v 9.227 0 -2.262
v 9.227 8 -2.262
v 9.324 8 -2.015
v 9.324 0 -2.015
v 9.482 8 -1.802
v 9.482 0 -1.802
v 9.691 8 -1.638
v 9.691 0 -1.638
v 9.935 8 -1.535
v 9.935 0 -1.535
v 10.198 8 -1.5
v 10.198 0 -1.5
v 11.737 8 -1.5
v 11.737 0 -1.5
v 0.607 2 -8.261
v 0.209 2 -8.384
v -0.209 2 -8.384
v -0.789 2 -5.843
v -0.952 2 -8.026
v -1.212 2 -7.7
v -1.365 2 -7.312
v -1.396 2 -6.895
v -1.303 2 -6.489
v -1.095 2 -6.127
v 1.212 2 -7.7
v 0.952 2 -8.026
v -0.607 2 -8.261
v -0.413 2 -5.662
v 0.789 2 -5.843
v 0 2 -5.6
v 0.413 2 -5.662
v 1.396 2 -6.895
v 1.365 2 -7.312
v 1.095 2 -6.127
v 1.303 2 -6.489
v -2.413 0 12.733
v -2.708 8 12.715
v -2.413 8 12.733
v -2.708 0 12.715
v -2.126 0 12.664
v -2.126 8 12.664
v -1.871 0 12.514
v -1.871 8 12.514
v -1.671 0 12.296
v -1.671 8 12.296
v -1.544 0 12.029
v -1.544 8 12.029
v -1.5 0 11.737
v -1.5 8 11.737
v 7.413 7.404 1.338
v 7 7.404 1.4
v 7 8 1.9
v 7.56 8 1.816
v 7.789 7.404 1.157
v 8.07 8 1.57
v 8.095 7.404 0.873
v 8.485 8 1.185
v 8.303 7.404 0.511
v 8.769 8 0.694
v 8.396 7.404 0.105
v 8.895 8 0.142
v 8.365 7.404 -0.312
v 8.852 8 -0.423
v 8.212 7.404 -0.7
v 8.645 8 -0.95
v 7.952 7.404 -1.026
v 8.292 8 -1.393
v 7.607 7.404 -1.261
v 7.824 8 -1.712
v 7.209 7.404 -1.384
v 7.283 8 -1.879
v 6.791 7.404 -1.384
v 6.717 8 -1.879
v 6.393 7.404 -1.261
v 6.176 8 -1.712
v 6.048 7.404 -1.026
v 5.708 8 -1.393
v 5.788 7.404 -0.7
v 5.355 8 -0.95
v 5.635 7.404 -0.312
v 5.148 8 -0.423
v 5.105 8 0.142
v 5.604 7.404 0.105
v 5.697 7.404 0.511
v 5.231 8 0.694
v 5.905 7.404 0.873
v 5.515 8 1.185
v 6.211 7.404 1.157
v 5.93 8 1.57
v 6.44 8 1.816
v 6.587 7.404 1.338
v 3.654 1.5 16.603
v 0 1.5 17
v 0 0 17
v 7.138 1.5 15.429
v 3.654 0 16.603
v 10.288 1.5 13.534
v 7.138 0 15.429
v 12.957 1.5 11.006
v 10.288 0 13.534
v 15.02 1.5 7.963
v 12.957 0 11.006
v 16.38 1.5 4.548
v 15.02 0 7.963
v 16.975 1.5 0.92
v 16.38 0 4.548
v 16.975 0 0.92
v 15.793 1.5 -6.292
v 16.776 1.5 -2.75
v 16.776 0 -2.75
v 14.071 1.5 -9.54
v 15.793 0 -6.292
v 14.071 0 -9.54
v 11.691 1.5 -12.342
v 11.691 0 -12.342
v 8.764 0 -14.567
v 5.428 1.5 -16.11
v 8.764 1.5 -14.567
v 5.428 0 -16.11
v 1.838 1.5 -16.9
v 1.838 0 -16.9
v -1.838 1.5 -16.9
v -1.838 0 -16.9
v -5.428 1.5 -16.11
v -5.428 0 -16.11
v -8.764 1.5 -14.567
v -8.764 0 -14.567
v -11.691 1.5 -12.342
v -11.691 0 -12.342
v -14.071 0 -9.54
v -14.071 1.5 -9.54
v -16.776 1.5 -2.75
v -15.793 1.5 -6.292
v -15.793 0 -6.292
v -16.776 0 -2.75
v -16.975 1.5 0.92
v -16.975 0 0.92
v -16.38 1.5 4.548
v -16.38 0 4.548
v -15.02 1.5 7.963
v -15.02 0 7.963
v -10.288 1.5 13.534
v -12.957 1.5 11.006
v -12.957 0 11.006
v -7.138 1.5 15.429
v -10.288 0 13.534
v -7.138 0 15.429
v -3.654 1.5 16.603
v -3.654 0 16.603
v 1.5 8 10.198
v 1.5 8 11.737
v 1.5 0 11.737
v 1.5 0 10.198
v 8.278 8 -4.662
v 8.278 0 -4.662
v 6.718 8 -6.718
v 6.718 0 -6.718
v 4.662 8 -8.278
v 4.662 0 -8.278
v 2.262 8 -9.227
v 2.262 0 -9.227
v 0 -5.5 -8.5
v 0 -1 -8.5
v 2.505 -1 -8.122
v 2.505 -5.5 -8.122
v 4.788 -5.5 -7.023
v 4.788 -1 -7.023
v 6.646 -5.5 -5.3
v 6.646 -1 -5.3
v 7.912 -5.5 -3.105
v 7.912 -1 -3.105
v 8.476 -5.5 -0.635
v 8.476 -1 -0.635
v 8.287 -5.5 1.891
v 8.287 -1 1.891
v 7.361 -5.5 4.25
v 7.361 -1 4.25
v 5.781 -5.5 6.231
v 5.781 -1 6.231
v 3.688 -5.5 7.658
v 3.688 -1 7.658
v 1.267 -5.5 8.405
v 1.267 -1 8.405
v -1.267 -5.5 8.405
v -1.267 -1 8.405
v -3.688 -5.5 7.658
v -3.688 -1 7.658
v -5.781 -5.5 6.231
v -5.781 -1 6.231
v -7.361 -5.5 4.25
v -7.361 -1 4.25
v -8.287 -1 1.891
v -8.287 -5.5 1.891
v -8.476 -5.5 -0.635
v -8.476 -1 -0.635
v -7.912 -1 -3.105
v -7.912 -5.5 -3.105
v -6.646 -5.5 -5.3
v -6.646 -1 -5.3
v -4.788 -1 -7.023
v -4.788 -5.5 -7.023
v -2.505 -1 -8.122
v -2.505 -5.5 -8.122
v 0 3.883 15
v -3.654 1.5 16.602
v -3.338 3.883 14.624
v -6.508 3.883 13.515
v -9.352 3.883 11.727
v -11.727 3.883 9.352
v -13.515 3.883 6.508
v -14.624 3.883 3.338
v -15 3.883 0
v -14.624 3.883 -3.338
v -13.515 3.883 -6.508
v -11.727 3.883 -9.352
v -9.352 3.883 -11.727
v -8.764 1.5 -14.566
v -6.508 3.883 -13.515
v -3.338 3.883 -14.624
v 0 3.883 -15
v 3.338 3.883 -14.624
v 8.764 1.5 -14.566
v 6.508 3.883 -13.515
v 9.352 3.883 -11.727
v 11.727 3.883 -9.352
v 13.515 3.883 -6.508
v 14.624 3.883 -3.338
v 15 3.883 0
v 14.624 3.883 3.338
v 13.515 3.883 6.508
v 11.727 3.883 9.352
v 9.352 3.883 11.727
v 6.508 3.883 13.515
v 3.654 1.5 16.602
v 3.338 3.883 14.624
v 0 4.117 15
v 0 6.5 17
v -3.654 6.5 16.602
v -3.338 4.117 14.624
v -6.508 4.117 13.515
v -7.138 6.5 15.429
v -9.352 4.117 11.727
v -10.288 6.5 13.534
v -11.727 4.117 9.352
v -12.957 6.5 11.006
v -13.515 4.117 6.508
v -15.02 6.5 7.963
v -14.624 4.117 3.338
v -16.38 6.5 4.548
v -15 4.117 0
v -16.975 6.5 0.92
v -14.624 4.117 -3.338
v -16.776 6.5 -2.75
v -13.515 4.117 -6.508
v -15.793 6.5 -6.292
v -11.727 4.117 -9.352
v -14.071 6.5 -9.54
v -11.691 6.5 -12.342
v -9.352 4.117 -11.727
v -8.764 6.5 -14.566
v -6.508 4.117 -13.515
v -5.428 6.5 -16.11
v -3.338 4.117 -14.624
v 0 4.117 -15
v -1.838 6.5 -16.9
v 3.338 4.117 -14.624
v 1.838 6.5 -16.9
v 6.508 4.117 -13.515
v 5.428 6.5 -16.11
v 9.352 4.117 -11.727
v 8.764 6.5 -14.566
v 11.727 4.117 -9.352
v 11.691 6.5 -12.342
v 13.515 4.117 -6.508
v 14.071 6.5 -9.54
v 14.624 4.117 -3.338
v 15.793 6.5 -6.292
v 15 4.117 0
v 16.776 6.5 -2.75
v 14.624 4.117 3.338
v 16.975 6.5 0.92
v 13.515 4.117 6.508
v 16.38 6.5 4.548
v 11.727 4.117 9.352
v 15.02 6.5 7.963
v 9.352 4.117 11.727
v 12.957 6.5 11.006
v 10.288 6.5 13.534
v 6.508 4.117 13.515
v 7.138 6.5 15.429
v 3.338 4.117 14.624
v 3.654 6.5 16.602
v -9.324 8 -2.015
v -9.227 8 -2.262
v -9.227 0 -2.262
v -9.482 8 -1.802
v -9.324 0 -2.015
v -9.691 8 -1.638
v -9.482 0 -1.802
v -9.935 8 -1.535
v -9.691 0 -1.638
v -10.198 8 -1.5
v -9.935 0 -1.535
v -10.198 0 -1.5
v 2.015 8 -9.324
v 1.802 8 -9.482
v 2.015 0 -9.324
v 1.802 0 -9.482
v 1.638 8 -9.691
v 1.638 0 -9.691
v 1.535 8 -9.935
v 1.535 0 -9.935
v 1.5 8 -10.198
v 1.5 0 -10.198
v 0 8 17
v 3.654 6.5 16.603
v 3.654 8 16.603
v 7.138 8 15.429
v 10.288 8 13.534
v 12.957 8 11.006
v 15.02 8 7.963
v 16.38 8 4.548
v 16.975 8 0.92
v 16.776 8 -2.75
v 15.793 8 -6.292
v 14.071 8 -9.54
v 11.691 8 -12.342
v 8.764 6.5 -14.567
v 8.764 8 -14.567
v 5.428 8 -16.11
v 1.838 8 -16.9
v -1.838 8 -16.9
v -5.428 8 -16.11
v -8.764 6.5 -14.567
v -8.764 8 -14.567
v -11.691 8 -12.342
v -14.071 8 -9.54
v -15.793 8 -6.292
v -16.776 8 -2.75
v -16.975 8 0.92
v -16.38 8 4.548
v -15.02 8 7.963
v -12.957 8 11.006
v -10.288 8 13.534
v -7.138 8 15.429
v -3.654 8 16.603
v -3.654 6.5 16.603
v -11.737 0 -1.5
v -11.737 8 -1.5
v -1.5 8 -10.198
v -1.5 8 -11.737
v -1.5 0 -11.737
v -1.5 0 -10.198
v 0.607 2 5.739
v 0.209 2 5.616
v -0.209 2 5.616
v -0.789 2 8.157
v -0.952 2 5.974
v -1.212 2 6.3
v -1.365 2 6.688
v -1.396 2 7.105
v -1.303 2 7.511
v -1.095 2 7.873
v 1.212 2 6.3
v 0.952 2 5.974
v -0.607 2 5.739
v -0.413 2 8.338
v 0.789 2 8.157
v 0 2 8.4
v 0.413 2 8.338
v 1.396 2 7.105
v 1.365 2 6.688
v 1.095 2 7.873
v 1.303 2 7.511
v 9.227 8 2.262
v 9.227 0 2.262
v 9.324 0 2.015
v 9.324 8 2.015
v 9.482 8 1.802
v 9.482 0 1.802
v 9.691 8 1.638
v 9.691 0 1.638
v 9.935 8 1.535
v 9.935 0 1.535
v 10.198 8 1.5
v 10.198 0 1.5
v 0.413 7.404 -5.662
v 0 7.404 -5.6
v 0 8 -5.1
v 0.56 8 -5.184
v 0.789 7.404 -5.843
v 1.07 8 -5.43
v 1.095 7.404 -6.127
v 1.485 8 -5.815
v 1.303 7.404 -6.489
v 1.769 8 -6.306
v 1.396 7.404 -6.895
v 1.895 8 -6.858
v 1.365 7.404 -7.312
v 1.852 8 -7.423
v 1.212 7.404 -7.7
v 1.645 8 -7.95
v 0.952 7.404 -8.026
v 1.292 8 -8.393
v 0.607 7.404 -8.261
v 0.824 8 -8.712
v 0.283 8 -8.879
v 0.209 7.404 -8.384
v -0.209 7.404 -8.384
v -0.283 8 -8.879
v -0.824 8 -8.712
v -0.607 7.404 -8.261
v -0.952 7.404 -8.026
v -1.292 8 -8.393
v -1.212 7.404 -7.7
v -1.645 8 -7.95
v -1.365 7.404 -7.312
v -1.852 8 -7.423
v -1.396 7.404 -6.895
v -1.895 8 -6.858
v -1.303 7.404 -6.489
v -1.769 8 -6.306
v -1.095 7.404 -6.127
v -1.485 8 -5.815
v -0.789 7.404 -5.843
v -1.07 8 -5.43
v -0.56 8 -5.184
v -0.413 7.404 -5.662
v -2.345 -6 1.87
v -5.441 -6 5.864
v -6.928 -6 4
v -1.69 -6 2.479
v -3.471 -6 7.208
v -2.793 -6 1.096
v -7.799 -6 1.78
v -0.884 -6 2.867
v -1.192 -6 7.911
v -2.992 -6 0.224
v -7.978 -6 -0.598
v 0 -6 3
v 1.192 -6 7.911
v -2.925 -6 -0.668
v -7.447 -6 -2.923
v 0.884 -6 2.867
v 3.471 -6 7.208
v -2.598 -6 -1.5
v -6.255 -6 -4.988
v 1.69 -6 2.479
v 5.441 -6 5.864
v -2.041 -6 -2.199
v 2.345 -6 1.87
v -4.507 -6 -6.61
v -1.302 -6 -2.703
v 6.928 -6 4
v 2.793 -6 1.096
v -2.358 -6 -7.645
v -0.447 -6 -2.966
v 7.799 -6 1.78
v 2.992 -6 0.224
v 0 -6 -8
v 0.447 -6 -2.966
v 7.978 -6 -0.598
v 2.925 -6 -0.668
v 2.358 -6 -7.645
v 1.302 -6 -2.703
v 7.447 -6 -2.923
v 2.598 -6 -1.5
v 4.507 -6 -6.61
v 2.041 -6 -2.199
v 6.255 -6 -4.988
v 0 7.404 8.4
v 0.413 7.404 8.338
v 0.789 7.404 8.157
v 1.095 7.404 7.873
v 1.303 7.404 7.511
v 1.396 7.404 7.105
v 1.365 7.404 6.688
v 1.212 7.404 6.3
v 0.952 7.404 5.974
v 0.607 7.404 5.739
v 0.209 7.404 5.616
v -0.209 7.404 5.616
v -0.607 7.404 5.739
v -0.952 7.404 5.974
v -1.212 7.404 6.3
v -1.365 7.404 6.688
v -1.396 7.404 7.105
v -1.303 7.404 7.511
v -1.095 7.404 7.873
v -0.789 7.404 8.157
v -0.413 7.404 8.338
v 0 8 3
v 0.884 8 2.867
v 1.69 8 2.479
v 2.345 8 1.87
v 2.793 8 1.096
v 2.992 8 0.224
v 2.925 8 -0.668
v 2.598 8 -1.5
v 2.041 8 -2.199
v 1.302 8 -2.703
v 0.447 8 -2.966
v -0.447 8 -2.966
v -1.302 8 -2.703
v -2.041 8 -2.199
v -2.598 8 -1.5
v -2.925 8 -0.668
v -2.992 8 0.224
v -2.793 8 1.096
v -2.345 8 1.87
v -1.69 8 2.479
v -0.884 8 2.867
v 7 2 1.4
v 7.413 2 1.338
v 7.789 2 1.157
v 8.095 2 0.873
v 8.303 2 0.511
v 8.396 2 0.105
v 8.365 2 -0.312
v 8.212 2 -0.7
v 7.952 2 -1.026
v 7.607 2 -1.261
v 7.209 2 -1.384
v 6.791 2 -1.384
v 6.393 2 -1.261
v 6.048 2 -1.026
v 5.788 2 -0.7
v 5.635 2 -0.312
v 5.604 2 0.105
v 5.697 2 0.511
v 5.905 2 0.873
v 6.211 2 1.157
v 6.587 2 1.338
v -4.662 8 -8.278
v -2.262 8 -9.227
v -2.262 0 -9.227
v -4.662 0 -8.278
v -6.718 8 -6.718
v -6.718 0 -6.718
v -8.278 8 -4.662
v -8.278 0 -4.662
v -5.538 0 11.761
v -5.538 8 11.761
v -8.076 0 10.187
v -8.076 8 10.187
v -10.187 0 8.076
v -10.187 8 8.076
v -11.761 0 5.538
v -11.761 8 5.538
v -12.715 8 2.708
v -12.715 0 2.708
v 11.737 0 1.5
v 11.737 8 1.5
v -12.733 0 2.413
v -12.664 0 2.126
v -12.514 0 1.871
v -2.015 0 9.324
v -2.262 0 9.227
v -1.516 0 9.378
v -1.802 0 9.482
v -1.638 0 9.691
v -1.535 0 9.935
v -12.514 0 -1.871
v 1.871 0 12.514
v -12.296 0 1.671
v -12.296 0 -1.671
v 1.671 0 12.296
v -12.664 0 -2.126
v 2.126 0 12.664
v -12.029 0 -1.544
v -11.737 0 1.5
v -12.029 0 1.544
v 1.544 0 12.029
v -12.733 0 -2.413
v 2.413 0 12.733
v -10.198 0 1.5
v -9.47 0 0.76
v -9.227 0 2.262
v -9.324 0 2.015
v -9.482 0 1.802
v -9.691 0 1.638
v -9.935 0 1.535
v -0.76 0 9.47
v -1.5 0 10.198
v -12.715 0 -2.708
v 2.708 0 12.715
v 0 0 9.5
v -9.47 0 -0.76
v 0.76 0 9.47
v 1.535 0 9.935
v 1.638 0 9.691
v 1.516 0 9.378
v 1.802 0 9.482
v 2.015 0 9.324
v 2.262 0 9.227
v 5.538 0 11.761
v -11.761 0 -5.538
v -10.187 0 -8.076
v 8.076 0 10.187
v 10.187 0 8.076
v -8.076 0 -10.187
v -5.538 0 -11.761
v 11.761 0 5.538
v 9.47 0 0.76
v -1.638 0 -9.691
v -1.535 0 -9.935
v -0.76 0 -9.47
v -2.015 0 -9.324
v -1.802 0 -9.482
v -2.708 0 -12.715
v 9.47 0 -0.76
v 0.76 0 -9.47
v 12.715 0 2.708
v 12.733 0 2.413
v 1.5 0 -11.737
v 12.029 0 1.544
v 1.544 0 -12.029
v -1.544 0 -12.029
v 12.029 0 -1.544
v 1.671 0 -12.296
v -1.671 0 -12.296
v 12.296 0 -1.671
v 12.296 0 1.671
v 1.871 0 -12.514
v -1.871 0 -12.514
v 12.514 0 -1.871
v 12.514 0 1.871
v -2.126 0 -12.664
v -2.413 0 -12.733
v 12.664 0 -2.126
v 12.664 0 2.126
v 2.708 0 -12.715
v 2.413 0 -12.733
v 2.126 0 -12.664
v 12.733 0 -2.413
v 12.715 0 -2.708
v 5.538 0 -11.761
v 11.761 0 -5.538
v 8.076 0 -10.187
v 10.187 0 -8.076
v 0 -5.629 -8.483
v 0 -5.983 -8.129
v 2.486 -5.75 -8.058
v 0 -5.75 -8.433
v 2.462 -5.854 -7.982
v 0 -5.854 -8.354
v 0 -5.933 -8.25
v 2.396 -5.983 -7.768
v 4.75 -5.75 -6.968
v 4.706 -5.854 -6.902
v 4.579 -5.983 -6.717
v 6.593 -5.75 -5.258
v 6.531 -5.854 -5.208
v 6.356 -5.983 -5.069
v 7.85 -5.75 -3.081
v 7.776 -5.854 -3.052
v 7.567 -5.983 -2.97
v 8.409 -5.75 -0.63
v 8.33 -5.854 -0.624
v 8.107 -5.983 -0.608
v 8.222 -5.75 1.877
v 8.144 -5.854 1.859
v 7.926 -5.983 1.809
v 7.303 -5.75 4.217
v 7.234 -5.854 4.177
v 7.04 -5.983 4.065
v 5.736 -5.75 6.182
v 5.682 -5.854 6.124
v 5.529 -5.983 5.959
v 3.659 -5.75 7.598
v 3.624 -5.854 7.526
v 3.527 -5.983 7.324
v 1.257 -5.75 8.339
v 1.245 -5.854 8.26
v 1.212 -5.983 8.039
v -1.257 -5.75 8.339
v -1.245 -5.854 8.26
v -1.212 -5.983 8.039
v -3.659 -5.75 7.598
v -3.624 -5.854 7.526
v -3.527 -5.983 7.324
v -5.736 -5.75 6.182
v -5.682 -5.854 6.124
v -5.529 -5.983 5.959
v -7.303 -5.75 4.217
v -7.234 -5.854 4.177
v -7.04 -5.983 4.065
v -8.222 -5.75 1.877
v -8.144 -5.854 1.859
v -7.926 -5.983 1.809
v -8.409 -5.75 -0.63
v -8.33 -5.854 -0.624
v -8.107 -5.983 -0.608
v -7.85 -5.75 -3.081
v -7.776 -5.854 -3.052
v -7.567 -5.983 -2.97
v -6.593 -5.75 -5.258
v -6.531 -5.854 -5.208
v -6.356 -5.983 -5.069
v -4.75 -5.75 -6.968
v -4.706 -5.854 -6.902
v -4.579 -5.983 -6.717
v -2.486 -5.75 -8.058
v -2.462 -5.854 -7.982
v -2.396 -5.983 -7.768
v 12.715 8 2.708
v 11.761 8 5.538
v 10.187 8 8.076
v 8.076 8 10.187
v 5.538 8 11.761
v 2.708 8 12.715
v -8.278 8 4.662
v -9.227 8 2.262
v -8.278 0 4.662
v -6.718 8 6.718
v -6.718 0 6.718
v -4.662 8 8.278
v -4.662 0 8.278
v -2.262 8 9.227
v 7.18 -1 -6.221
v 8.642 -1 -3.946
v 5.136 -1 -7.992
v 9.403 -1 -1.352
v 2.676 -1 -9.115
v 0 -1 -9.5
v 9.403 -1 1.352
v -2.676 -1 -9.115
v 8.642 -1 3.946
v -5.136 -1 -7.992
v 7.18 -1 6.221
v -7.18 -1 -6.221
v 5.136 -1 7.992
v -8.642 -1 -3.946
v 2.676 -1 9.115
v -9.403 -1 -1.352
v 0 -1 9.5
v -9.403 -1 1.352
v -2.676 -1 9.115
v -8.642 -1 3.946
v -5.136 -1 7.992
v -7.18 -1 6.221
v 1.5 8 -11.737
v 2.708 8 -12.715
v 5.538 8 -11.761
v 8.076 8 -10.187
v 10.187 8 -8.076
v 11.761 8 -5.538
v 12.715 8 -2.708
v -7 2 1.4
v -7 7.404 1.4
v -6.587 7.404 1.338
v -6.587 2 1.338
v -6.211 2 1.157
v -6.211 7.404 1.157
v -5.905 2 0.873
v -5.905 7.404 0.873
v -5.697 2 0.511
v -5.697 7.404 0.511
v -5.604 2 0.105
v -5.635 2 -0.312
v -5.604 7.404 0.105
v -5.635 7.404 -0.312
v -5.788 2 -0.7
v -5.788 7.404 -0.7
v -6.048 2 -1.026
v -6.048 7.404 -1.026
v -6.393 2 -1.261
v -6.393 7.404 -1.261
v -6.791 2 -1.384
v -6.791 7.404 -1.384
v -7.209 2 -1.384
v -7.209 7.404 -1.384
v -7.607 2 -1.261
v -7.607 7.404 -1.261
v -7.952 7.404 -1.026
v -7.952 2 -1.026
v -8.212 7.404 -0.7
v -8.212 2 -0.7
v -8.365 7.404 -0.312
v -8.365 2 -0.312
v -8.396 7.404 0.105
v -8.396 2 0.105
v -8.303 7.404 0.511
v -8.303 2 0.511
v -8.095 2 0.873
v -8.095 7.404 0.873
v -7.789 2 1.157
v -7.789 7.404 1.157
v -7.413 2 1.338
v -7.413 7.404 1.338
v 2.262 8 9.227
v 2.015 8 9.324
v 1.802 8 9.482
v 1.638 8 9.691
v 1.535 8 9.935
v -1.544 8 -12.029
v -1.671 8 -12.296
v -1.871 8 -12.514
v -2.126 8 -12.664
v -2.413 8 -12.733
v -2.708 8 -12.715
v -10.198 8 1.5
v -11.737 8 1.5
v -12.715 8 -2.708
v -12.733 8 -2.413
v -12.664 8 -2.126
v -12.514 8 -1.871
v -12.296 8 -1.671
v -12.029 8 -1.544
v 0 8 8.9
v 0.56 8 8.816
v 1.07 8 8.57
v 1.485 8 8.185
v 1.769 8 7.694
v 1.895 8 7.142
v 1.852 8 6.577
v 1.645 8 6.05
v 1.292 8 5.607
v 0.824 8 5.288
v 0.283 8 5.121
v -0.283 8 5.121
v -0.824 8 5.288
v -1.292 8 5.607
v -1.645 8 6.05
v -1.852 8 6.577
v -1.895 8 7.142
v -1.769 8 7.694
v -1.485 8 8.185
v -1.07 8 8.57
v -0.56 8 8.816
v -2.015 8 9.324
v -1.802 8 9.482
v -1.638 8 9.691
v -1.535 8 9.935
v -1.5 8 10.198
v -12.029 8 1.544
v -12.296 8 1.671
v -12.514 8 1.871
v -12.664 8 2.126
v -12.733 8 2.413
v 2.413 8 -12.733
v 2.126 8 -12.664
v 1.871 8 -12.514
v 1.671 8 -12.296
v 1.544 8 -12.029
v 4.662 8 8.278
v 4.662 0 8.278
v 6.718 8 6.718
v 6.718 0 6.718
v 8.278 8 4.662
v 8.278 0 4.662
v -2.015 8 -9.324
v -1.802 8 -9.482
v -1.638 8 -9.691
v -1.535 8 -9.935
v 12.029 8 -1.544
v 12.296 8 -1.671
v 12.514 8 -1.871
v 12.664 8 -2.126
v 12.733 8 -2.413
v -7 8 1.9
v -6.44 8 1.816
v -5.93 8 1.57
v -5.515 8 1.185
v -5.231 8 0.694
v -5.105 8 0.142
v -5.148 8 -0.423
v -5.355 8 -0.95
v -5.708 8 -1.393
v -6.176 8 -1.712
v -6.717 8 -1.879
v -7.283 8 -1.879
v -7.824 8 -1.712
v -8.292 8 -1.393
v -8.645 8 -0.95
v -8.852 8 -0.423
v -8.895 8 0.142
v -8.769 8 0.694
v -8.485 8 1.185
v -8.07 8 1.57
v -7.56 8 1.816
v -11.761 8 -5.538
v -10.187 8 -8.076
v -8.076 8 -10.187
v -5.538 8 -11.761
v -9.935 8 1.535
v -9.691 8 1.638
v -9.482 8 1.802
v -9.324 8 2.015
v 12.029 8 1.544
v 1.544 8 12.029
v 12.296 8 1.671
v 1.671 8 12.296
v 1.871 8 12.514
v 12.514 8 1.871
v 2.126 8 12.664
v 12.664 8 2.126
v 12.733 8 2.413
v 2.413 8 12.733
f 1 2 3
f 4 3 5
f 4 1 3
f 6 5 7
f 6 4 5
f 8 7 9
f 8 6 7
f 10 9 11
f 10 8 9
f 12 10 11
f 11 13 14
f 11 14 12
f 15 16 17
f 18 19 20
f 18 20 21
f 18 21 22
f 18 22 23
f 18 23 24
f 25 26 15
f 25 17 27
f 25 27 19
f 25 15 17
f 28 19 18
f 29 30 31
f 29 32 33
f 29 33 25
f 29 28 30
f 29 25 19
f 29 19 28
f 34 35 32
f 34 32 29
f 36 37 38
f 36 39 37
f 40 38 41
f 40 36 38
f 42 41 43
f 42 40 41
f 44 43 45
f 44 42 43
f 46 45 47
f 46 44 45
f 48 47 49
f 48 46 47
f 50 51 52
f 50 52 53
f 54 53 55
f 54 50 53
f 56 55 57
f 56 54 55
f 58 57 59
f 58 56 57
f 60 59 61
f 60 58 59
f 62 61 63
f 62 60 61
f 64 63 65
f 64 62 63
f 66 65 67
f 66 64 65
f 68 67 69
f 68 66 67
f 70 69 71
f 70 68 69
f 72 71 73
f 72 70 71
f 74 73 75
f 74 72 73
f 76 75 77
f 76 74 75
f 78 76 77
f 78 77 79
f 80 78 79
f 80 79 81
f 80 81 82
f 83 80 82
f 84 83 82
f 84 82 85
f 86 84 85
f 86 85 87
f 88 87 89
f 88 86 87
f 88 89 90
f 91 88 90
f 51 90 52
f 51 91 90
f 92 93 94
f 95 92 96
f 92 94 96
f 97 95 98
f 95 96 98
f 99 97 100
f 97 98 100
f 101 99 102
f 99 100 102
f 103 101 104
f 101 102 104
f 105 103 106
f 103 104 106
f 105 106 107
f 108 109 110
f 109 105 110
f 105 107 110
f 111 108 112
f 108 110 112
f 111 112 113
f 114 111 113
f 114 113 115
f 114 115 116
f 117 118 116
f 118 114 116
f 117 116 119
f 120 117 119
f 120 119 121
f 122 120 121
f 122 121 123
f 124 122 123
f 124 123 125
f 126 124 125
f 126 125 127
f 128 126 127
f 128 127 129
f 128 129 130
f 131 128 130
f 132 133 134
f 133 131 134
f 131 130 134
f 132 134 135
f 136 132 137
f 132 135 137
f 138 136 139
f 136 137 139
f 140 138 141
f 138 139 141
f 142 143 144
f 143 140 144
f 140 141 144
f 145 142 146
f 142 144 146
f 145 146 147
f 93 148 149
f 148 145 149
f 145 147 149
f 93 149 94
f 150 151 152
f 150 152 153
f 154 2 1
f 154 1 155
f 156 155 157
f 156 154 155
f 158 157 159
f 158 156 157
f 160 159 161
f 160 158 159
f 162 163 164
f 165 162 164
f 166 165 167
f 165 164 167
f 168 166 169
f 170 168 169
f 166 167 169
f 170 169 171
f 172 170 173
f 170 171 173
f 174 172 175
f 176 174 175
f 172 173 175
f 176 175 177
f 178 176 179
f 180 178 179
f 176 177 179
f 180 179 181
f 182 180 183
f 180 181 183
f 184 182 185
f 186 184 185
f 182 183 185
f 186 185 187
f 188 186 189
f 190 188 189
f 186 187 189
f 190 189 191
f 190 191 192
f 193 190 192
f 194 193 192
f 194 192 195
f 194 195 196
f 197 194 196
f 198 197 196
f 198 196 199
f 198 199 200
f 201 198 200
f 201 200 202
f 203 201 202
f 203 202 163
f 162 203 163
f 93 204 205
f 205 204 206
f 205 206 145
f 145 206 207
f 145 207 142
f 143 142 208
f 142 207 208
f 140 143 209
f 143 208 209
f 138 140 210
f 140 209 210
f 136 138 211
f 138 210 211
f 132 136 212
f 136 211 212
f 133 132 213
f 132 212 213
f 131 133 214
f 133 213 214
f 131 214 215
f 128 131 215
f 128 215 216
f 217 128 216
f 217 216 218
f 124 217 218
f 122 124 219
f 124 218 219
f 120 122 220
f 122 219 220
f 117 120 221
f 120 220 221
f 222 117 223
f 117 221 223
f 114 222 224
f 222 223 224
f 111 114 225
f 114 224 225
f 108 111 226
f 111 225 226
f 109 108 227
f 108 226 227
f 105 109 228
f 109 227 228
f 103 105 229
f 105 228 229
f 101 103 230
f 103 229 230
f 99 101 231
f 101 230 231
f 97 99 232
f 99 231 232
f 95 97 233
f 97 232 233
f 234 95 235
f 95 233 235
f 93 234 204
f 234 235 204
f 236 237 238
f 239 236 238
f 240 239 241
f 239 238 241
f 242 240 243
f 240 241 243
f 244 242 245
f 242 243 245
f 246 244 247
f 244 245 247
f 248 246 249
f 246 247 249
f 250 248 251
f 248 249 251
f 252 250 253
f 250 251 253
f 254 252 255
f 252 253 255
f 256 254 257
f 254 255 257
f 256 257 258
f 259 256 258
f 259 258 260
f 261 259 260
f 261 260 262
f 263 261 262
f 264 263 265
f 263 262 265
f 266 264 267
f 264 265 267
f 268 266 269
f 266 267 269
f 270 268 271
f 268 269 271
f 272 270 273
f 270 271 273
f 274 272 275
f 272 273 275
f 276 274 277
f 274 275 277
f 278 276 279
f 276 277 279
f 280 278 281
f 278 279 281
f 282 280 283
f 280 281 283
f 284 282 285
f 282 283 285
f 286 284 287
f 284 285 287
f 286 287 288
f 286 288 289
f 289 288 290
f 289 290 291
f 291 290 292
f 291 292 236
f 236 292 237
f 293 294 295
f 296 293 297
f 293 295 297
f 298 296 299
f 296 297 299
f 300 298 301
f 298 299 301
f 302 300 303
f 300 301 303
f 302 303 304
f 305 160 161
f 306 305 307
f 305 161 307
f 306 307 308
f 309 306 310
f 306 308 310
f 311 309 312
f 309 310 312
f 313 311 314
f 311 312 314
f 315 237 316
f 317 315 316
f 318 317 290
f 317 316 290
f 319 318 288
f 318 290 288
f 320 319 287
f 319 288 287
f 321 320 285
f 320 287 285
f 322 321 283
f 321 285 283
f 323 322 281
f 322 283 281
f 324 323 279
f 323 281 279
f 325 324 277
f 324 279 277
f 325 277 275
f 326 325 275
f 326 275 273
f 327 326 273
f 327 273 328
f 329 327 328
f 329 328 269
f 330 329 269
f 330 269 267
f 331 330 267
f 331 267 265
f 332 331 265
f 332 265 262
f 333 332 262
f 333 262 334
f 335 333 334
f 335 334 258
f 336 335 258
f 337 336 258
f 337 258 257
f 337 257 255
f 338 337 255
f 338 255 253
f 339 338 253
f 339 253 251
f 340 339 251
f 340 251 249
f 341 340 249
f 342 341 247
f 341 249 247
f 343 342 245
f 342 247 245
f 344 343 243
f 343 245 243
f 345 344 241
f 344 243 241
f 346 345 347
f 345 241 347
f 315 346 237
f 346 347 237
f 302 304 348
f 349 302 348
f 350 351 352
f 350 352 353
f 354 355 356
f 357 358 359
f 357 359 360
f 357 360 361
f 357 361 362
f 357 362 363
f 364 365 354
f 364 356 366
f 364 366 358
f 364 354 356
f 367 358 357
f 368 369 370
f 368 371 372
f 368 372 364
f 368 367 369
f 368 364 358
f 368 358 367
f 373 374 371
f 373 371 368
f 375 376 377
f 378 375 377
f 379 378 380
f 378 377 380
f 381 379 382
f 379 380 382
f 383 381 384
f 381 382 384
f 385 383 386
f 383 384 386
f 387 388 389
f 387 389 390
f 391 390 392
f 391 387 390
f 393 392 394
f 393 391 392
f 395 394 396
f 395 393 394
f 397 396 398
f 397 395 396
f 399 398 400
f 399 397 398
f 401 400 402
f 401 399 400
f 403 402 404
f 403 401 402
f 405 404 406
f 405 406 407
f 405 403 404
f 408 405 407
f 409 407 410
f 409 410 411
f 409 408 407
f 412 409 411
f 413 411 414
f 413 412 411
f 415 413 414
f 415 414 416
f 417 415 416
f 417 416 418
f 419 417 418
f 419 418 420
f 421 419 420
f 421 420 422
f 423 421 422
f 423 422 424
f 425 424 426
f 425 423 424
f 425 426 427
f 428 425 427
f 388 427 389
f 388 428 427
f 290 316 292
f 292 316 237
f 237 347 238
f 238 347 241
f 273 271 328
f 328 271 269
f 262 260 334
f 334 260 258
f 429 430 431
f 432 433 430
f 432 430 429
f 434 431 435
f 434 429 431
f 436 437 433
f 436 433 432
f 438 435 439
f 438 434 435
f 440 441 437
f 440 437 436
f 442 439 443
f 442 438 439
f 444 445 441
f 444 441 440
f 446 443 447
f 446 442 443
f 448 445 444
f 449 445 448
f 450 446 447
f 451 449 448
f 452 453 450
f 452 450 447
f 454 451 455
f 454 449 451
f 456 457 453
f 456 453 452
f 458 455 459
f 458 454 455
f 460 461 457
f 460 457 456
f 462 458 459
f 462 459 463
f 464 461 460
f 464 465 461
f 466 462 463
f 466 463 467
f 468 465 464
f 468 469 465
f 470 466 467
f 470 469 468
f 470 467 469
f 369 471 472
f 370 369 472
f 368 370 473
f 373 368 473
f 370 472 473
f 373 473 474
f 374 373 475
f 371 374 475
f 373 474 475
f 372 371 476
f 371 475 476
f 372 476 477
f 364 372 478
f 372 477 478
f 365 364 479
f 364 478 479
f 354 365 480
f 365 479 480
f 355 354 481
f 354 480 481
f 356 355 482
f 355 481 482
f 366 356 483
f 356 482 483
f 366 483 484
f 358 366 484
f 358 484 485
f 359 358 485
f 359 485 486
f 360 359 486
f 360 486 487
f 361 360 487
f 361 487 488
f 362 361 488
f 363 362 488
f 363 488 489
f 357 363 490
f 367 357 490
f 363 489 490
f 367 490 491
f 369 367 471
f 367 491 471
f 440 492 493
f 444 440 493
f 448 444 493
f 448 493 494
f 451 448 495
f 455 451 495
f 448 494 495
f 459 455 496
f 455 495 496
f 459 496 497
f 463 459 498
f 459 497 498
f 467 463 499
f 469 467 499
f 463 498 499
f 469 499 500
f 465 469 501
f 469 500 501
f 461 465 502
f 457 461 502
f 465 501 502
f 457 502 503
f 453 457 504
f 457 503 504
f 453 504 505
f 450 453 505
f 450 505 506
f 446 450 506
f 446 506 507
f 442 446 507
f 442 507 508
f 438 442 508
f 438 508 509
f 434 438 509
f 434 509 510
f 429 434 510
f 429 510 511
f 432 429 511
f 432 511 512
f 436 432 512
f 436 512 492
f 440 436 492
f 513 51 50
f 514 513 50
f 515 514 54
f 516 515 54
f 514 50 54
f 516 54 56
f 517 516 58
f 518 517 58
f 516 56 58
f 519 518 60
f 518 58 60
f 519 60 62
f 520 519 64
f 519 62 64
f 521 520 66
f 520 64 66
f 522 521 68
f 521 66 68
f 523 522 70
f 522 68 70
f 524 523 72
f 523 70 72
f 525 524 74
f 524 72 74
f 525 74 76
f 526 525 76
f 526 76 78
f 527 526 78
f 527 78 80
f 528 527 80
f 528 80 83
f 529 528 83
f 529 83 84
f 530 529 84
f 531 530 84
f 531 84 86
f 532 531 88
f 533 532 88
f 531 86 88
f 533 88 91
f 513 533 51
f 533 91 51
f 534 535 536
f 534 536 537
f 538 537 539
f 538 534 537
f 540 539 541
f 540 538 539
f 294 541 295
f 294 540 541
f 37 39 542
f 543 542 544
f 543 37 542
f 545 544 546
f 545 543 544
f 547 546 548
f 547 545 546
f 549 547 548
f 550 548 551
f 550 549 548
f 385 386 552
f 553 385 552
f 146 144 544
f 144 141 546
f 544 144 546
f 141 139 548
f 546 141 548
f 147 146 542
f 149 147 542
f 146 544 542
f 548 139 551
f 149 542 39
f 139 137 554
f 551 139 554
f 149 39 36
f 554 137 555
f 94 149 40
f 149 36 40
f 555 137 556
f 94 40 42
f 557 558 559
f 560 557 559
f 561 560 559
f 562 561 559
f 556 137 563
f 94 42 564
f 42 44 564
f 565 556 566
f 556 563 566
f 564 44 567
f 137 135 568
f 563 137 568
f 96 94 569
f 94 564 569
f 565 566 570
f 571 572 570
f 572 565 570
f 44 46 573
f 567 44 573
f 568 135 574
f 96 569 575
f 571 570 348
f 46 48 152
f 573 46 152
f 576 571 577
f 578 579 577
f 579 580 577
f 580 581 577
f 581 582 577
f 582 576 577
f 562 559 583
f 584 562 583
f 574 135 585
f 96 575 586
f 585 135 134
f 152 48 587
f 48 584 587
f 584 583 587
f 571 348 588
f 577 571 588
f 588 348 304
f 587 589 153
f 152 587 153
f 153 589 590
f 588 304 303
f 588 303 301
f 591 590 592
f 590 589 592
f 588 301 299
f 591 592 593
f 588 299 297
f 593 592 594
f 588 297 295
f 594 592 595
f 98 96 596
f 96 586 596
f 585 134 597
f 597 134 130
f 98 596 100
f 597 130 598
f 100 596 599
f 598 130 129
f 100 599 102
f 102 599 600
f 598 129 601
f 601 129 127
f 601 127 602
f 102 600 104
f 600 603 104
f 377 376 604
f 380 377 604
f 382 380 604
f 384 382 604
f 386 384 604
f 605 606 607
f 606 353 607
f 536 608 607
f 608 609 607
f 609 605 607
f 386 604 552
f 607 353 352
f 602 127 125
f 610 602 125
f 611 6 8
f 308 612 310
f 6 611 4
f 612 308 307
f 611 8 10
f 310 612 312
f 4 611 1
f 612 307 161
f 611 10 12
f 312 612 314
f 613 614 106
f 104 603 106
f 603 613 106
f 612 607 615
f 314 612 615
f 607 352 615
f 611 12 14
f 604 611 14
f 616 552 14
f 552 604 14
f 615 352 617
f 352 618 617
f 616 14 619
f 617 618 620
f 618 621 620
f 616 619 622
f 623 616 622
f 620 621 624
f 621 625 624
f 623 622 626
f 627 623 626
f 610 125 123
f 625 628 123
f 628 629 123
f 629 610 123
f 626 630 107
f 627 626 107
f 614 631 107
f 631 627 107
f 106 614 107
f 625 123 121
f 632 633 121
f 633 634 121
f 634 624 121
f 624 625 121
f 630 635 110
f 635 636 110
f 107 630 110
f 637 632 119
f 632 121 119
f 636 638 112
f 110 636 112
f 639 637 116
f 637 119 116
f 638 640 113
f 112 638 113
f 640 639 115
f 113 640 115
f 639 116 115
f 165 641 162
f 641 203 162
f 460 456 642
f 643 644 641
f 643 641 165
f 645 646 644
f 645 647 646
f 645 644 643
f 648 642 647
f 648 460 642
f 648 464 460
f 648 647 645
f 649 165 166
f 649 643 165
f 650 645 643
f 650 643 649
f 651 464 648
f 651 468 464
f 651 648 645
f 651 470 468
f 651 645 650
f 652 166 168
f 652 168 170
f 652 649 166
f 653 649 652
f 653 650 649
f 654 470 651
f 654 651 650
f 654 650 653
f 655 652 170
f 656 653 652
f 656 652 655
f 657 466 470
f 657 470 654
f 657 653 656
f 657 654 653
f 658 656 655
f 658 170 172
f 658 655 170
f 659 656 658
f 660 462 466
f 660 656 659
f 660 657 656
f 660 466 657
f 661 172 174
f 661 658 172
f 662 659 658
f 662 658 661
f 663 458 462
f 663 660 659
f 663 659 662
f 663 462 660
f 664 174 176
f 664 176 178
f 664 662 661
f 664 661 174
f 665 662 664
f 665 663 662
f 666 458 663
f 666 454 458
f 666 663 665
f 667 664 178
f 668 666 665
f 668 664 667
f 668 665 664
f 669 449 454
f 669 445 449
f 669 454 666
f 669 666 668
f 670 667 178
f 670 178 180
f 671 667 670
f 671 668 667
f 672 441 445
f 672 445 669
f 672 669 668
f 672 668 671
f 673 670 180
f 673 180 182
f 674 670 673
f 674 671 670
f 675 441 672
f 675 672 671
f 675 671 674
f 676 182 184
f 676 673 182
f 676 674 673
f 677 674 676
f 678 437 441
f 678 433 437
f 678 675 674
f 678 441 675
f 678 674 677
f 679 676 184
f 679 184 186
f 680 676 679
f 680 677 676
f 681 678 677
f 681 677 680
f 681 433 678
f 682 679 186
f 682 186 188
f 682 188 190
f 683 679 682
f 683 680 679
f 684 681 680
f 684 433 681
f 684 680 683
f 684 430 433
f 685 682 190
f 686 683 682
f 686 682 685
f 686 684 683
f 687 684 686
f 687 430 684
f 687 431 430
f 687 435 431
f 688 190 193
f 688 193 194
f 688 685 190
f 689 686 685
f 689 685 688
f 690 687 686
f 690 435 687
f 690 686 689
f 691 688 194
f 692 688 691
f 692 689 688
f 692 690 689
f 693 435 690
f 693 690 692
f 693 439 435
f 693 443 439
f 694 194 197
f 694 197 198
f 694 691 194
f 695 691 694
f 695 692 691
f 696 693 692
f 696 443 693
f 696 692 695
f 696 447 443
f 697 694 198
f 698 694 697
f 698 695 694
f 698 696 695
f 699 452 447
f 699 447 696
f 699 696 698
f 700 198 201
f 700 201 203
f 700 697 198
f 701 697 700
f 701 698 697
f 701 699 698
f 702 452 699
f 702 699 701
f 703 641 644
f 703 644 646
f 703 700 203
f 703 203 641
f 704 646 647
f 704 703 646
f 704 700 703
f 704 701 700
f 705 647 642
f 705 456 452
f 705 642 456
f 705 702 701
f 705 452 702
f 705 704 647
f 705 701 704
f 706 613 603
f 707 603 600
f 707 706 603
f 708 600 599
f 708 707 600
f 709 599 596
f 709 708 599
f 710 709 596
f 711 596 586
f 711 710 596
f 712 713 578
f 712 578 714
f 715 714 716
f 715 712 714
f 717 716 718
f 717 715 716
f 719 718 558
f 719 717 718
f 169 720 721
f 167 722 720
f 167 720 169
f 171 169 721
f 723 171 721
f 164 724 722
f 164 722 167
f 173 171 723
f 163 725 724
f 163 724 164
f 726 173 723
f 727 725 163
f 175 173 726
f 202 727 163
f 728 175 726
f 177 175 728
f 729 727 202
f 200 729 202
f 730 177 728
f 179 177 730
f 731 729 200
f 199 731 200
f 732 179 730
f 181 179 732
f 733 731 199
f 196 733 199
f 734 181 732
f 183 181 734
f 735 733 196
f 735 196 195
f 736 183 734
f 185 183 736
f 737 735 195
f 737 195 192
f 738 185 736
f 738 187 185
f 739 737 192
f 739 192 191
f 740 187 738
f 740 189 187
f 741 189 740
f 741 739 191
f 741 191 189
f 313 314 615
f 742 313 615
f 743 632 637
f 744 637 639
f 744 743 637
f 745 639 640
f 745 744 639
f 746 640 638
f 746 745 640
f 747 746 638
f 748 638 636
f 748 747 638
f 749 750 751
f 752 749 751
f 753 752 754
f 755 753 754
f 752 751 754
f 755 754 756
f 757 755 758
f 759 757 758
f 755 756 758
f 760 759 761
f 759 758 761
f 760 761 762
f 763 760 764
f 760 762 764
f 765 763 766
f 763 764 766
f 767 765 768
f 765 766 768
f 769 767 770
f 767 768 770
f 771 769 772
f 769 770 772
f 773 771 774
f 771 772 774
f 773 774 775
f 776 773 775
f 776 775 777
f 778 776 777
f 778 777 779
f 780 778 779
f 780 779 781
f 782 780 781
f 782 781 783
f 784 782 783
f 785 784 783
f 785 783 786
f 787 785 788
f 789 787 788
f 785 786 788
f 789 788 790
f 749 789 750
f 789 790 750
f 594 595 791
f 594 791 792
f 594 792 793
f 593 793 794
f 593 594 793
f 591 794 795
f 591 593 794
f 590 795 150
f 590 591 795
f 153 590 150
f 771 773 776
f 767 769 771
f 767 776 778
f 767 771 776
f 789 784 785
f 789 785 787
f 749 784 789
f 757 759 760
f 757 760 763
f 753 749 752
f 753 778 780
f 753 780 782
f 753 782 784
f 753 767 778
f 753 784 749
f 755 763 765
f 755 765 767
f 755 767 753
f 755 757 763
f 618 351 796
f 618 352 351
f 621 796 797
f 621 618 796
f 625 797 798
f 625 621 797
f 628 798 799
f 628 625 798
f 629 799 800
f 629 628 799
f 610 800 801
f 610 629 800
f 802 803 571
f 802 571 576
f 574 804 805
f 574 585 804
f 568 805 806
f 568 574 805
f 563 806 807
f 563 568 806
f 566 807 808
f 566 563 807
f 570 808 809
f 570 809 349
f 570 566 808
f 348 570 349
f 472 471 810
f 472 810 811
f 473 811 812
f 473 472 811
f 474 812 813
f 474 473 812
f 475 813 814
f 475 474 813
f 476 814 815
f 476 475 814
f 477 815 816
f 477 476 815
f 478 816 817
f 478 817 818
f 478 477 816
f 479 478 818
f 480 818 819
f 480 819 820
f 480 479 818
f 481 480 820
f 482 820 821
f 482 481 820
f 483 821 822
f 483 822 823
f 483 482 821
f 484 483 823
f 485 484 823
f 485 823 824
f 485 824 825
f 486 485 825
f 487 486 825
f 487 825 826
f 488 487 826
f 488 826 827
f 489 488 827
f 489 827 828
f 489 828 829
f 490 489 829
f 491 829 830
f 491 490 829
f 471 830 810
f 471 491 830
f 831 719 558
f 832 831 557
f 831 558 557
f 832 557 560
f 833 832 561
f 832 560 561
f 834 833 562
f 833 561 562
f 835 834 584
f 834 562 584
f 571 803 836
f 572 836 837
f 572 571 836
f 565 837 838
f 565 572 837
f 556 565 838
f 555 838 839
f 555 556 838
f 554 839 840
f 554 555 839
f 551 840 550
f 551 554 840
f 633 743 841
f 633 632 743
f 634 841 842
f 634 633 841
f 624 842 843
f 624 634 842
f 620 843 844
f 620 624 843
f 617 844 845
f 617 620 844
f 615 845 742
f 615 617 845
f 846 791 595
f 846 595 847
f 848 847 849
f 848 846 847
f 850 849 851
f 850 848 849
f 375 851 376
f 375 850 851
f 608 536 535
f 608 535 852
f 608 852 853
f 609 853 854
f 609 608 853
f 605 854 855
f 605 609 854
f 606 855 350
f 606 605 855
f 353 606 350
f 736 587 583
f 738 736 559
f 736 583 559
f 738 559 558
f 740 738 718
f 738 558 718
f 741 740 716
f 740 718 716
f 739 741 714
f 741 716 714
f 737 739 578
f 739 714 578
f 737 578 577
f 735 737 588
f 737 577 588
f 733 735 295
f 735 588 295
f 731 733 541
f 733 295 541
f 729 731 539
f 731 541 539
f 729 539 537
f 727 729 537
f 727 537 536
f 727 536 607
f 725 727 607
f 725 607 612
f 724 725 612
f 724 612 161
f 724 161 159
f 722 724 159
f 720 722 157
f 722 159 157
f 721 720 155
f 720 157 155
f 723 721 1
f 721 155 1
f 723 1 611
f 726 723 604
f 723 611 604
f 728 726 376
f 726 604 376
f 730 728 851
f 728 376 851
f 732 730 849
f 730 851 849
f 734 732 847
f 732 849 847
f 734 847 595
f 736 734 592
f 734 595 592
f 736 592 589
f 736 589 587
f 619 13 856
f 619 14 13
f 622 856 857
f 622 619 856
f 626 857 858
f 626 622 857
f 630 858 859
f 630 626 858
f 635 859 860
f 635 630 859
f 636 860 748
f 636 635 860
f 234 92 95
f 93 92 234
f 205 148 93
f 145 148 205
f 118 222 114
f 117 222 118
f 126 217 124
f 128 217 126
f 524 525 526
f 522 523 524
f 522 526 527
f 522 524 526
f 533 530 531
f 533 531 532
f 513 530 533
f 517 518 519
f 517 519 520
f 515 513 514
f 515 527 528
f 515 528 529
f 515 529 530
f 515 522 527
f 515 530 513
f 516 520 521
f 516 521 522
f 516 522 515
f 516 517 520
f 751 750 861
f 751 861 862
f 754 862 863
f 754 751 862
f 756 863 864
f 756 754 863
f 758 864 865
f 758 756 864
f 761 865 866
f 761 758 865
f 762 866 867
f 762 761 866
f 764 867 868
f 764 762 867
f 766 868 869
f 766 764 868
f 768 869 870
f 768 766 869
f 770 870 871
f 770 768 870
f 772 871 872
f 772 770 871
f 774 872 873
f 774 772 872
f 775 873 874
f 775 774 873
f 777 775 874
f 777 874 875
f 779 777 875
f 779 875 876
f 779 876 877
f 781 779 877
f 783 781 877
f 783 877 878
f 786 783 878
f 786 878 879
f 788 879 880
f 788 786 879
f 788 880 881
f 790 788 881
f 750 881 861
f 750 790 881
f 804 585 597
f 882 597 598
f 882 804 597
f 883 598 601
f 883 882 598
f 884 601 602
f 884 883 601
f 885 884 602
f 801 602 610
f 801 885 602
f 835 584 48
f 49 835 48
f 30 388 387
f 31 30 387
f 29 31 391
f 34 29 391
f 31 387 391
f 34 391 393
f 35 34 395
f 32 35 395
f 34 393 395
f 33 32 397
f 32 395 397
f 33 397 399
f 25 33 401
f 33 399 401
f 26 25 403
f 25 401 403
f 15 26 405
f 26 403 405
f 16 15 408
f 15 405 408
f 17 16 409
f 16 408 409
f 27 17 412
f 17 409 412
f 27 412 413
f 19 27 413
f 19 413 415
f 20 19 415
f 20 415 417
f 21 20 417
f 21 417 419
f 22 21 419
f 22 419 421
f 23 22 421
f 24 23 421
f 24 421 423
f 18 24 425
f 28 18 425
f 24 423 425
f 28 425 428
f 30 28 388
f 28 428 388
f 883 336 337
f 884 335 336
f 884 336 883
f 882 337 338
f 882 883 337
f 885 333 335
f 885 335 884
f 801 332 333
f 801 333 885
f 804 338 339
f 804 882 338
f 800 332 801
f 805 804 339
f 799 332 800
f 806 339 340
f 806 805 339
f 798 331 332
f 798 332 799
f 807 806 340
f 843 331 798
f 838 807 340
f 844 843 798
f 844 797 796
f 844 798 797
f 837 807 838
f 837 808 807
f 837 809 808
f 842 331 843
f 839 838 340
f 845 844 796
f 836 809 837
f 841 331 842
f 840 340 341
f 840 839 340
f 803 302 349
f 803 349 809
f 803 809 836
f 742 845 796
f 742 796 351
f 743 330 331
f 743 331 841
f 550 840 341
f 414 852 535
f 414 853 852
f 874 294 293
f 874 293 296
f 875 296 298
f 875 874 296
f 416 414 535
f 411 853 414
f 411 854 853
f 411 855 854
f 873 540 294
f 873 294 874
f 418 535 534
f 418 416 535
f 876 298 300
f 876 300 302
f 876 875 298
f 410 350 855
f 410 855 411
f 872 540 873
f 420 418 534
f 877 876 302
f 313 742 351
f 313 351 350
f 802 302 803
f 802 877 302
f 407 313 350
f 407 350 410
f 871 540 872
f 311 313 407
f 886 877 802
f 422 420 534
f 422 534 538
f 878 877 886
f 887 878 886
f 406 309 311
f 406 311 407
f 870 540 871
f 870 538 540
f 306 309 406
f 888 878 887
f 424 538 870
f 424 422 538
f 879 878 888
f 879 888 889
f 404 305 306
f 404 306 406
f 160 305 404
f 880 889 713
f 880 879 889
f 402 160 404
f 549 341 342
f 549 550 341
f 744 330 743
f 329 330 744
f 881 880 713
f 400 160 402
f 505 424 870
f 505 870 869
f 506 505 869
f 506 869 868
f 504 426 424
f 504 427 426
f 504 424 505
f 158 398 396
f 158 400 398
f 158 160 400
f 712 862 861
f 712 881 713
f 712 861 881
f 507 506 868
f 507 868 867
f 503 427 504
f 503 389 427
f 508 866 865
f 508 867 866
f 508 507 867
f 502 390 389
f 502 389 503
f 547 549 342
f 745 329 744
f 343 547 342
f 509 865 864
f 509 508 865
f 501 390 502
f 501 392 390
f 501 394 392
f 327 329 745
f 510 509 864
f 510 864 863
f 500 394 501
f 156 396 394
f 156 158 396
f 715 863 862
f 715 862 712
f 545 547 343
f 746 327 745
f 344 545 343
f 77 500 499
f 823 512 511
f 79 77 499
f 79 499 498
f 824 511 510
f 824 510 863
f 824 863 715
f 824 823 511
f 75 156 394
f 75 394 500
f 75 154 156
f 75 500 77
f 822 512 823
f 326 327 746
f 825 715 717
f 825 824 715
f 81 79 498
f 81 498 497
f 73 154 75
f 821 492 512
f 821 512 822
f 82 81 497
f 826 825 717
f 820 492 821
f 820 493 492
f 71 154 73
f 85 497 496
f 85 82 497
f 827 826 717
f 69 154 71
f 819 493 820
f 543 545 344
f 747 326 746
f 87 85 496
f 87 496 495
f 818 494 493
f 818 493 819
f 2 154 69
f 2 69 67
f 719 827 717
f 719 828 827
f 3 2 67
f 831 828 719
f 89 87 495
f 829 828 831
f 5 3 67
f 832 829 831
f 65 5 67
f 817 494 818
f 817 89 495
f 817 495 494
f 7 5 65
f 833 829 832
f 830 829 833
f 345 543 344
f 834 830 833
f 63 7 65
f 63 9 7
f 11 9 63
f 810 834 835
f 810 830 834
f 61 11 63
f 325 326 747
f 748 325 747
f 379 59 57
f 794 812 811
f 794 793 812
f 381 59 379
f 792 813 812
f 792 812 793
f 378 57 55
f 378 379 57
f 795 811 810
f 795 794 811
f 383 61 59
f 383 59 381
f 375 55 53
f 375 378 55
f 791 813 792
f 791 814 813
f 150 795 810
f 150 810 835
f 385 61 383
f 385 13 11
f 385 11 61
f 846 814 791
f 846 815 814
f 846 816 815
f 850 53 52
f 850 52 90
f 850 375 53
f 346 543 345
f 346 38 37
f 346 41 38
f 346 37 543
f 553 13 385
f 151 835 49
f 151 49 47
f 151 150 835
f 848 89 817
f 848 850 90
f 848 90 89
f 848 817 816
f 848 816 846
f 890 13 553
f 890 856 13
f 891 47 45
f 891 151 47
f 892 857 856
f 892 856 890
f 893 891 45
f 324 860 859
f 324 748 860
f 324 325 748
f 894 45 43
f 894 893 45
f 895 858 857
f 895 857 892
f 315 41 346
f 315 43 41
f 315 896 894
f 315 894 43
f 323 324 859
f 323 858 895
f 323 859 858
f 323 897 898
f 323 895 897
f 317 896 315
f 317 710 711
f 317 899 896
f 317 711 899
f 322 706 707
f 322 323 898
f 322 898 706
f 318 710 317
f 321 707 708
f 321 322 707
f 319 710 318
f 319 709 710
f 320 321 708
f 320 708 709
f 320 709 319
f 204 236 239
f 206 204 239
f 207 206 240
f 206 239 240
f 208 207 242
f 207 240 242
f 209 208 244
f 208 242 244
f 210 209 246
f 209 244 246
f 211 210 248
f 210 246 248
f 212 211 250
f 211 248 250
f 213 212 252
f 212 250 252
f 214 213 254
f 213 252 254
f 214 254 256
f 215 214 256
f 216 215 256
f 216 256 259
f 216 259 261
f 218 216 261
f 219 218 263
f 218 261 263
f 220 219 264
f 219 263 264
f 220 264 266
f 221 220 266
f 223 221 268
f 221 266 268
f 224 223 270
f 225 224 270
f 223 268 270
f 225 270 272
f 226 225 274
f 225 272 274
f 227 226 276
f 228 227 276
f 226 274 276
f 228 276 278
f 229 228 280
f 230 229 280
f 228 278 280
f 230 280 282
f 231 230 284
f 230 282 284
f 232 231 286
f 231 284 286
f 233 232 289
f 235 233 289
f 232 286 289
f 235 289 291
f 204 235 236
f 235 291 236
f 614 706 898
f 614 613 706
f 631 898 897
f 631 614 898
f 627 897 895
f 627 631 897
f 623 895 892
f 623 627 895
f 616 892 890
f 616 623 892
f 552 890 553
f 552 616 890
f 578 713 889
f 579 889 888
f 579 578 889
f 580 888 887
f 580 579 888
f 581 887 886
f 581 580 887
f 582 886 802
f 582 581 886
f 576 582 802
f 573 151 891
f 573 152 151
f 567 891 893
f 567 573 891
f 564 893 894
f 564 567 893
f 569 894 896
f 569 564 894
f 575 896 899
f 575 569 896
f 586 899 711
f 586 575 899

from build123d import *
from OCP.BRepFilletAPI import BRepFilletAPI_MakeChamfer

# Parameters (mm, degrees)
SKETCH_1_R          = 17
SKETCH_1_R_2        = 1.4
EXTRUDE_1_DEPTH     = 8
SKETCH_2_W          = 2
SKETCH_2_H          = 5
SKETCH_5_R          = 1.4
CUT_EXTRUDE_3_DEPTH = 6
SKETCH_6_R          = 8.5
EXTRUDE_2_DEPTH     = 6
SKETCH_4_R          = 3
CUT_EXTRUDE_2_DEPTH = 28.820855486
SKETCH_7_R          = 9.5
SKETCH_7_R_2        = 8.5
EXTRUDE_3_DEPTH     = 1
CHAMFER_1_SIZE      = 2.383507185
CHAMFER_1_SIZE_2    = 2
FILLET_1_R          = 0.5
CUT_EXTRUDE_START   = -10
CUT_EXTRUDE_4_DEPTH = 10
FILLET_2_R          = 1
CHAMFER_2_SIZE      = 0.5
CHAMFER_2_SIZE2     = 0.595876796


with BuildPart() as part:
    # 草图1 → 凸台-拉伸1 (new body)
    # profile 1 of 5: a face of its own
    with BuildSketch(Plane(origin=(0, 0, 0), x_dir=(1, 0, 0), z_dir=(0, 1, 0))):
        with Locations(Location((0, 0, 0), (0, 0, 270))):
            Circle(SKETCH_1_R)
        with Locations((-7, 0)):
            Circle(SKETCH_1_R_2, mode=Mode.SUBTRACT)
        with Locations((0, -7)):
            Circle(SKETCH_1_R_2, mode=Mode.SUBTRACT)
        with Locations((7, 0)):
            Circle(SKETCH_1_R_2, mode=Mode.SUBTRACT)
        with Locations((0, 7)):
            Circle(SKETCH_1_R_2, mode=Mode.SUBTRACT)
    # profile 2 of 5: a face of its own
    with BuildSketch(Plane(origin=(0, 0, 0), x_dir=(1, 0, 0), z_dir=(0, 1, 0))):
        with Locations((0, 7)):
            Circle(SKETCH_1_R_2)
    # profile 3 of 5: a face of its own
    with BuildSketch(Plane(origin=(0, 0, 0), x_dir=(1, 0, 0), z_dir=(0, 1, 0))):
        with Locations((-7, 0)):
            Circle(SKETCH_1_R_2)
    # profile 4 of 5: a face of its own
    with BuildSketch(Plane(origin=(0, 0, 0), x_dir=(1, 0, 0), z_dir=(0, 1, 0))):
        with Locations((0, -7)):
            Circle(SKETCH_1_R_2)
    # profile 5 of 5: a face of its own
    with BuildSketch(Plane(origin=(0, 0, 0), x_dir=(1, 0, 0), z_dir=(0, 1, 0))):
        with Locations((7, 0)):
            Circle(SKETCH_1_R_2)
    extrude(amount=EXTRUDE_1_DEPTH)

    # 草图2 → 切除-旋转1 (revolve, cut)
    with BuildSketch(Plane.XY, mode=Mode.PRIVATE) as cut_revolve_1_sk:
        with Locations((16, 4)):
            Rectangle(SKETCH_2_W, SKETCH_2_H)
    revolve(cut_revolve_1_sk.sketch.rotate(Axis((0, 8, 0), (0, -1, 0)), 90), axis=Axis((0, 8, 0), (0, -1, 0)), mode=Mode.SUBTRACT)

    # 草图5 → 切除-拉伸3 (cut)
    with BuildSketch(Plane(origin=(0, 8, 0), x_dir=(1, 0, 0), z_dir=(0, 1, 0))):
        with Locations(Location((0, 7, 0), (0, 0, 270))):
            Circle(SKETCH_5_R)
        with Locations(Location((7, 0, 0), (0, 0, 270))):
            Circle(SKETCH_5_R)
        with Locations(Location((0, -7, 0), (0, 0, 270))):
            Circle(SKETCH_5_R)
        with Locations(Location((-7, 0, 0), (0, 0, 270))):
            Circle(SKETCH_5_R)
    extrude(amount=-CUT_EXTRUDE_3_DEPTH, mode=Mode.SUBTRACT)

    # 草图6 → 凸台-拉伸2 (add)
    with BuildSketch(Plane.XZ):
        with Locations(Location((0, 0, 0), (0, 0, 270))):
            Circle(SKETCH_6_R)
    extrude(amount=EXTRUDE_2_DEPTH)

    # 草图4 → 切除-拉伸2 (cut, through all)
    with BuildSketch(Plane(origin=(0, 8, 0), x_dir=(1, 0, 0), z_dir=(0, 1, 0))):
        with Locations(Location((0, 0, 0), (0, 0, 270))):
            Circle(SKETCH_4_R)
    extrude(amount=-CUT_EXTRUDE_2_DEPTH, mode=Mode.SUBTRACT)

    # 草图7 → 凸台-拉伸3 (add)
    with BuildSketch(Plane.XZ):
        with Locations(Location((0, 0, 0), (0, 0, 90))):
            Circle(SKETCH_7_R)
        with Locations(Location((0, 0, 0), (0, 0, 270))):
            Circle(SKETCH_7_R_2, mode=Mode.SUBTRACT)
    extrude(amount=EXTRUDE_3_DEPTH)

    # 倒角1
    chamfer_1_edges_1 = [part.edges().sort_by_distance(p)[0] for p in [
        (0, 6.5, -15),
    ]]
    chamfer_1_side_1 = [part.faces().sort_by_distance(p)[0] for p in [
        (0, 6.46, -15),
    ]]
    chamfer_1_edges_2 = [part.edges().sort_by_distance(p)[0] for p in [
        (0, 1.5, -15),
    ]]
    chamfer_1_side_2 = [part.faces().sort_by_distance(p)[0] for p in [
        (0, 1.5, -15.04),
    ]]
    chamfer_1 = BRepFilletAPI_MakeChamfer(part.part.solid().wrapped)
    for e in chamfer_1_edges_1:
        chamfer_1.Add(CHAMFER_1_SIZE - 0.0001, CHAMFER_1_SIZE_2 - 0.0001, e.wrapped, chamfer_1_side_1[0].wrapped)
    for e in chamfer_1_edges_2:
        chamfer_1.Add(CHAMFER_1_SIZE_2 - 0.0001, CHAMFER_1_SIZE - 0.0001, e.wrapped, chamfer_1_side_2[0].wrapped)
    add(Compound.cast(chamfer_1.Shape()), mode=Mode.REPLACE)  # a hair under: the kernel refuses the full size

    # 圆角1
    fillet_1_edges = [part.edges().sort_by_distance(p)[0] for p in [
        (0, -6, 8.5),
    ]]
    fillet(fillet_1_edges, radius=FILLET_1_R)

    # 草图8 → 切除-拉伸4 (cut)
    with BuildSketch(Plane.XZ.offset(CUT_EXTRUDE_START)):
        with BuildLine():
            Line((-1.5, 9.38083152), (-1.5, 12.91317157))
            ThreePointArc((-1.5, 12.91317157), (-9.192388155, 9.192388155), (-12.91317157, 1.5))
            Line((-12.91317157, 1.5), (-9.38083152, 1.5))
            ThreePointArc((-9.38083152, 1.5), (-6.717514421, 6.717514421), (-1.5, 9.38083152))
        make_face()
        with BuildLine():
            Line((-9.38083152, -1.5), (-12.91317157, -1.5))
            ThreePointArc((-12.91317157, -1.5), (-9.192388155, -9.192388155), (-1.5, -12.91317157))
            Line((-1.5, -12.91317157), (-1.5, -9.38083152))
            ThreePointArc((-1.5, -9.38083152), (-6.717514421, -6.717514421), (-9.38083152, -1.5))
        make_face()
        with BuildLine():
            ThreePointArc((1.5, -12.91317157), (9.192388155, -9.192388155), (12.91317157, -1.5))
            Line((12.91317157, -1.5), (9.38083152, -1.5))
            ThreePointArc((9.38083152, -1.5), (6.717514421, -6.717514421), (1.5, -9.38083152))
            Line((1.5, -9.38083152), (1.5, -12.91317157))
        make_face()
        with BuildLine():
            ThreePointArc((12.91317157, 1.5), (9.192388155, 9.192388155), (1.5, 12.91317157))
            Line((1.5, 12.91317157), (1.5, 9.38083152))
            ThreePointArc((1.5, 9.38083152), (6.717514421, 6.717514421), (9.38083152, 1.5))
            Line((9.38083152, 1.5), (12.91317157, 1.5))
        make_face()
    extrude(amount=CUT_EXTRUDE_4_DEPTH, mode=Mode.SUBTRACT)

    # 圆角2
    fillet_2_edges = [part.edges().sort_by_distance(p)[0] for p in [
        (-1.5, 4, 12.91317157),
        (-1.5, 4, 9.38083152),
        (-9.38083152, 4, 1.5),
        (-12.91317157, 4, 1.5),
        (12.91317157, 4, 1.5),
        (9.38083152, 4, 1.5),
        (1.5, 4, 9.38083152),
        (1.5, 4, 12.91317157),
        (1.5, 4, -12.91317157),
        (1.5, 4, -9.38083152),
        (9.38083152, 4, -1.5),
        (12.91317157, 4, -1.5),
        (-12.91317157, 4, -1.5),
        (-9.38083152, 4, -1.5),
        (-1.5, 4, -9.38083152),
        (-1.5, 4, -12.91317157),
    ]]
    fillet(fillet_2_edges, radius=FILLET_2_R)

    # 倒角2
    chamfer_2_edges = [part.edges().sort_by_distance(p)[0] for p in [
        (0, 8, -8.4),
        (7, 8, -1.4),
        (0, 8, 5.6),
        (-7, 8, -1.4),
    ]]
    chamfer_2_side = [part.faces().sort_by_distance(p)[0] for p in [
        (-10.967366811, 8, 1.019167389),
    ]]
    chamfer(chamfer_2_edges, length=CHAMFER_2_SIZE, length2=CHAMFER_2_SIZE2, reference=chamfer_2_side[0])


solid = part.part
